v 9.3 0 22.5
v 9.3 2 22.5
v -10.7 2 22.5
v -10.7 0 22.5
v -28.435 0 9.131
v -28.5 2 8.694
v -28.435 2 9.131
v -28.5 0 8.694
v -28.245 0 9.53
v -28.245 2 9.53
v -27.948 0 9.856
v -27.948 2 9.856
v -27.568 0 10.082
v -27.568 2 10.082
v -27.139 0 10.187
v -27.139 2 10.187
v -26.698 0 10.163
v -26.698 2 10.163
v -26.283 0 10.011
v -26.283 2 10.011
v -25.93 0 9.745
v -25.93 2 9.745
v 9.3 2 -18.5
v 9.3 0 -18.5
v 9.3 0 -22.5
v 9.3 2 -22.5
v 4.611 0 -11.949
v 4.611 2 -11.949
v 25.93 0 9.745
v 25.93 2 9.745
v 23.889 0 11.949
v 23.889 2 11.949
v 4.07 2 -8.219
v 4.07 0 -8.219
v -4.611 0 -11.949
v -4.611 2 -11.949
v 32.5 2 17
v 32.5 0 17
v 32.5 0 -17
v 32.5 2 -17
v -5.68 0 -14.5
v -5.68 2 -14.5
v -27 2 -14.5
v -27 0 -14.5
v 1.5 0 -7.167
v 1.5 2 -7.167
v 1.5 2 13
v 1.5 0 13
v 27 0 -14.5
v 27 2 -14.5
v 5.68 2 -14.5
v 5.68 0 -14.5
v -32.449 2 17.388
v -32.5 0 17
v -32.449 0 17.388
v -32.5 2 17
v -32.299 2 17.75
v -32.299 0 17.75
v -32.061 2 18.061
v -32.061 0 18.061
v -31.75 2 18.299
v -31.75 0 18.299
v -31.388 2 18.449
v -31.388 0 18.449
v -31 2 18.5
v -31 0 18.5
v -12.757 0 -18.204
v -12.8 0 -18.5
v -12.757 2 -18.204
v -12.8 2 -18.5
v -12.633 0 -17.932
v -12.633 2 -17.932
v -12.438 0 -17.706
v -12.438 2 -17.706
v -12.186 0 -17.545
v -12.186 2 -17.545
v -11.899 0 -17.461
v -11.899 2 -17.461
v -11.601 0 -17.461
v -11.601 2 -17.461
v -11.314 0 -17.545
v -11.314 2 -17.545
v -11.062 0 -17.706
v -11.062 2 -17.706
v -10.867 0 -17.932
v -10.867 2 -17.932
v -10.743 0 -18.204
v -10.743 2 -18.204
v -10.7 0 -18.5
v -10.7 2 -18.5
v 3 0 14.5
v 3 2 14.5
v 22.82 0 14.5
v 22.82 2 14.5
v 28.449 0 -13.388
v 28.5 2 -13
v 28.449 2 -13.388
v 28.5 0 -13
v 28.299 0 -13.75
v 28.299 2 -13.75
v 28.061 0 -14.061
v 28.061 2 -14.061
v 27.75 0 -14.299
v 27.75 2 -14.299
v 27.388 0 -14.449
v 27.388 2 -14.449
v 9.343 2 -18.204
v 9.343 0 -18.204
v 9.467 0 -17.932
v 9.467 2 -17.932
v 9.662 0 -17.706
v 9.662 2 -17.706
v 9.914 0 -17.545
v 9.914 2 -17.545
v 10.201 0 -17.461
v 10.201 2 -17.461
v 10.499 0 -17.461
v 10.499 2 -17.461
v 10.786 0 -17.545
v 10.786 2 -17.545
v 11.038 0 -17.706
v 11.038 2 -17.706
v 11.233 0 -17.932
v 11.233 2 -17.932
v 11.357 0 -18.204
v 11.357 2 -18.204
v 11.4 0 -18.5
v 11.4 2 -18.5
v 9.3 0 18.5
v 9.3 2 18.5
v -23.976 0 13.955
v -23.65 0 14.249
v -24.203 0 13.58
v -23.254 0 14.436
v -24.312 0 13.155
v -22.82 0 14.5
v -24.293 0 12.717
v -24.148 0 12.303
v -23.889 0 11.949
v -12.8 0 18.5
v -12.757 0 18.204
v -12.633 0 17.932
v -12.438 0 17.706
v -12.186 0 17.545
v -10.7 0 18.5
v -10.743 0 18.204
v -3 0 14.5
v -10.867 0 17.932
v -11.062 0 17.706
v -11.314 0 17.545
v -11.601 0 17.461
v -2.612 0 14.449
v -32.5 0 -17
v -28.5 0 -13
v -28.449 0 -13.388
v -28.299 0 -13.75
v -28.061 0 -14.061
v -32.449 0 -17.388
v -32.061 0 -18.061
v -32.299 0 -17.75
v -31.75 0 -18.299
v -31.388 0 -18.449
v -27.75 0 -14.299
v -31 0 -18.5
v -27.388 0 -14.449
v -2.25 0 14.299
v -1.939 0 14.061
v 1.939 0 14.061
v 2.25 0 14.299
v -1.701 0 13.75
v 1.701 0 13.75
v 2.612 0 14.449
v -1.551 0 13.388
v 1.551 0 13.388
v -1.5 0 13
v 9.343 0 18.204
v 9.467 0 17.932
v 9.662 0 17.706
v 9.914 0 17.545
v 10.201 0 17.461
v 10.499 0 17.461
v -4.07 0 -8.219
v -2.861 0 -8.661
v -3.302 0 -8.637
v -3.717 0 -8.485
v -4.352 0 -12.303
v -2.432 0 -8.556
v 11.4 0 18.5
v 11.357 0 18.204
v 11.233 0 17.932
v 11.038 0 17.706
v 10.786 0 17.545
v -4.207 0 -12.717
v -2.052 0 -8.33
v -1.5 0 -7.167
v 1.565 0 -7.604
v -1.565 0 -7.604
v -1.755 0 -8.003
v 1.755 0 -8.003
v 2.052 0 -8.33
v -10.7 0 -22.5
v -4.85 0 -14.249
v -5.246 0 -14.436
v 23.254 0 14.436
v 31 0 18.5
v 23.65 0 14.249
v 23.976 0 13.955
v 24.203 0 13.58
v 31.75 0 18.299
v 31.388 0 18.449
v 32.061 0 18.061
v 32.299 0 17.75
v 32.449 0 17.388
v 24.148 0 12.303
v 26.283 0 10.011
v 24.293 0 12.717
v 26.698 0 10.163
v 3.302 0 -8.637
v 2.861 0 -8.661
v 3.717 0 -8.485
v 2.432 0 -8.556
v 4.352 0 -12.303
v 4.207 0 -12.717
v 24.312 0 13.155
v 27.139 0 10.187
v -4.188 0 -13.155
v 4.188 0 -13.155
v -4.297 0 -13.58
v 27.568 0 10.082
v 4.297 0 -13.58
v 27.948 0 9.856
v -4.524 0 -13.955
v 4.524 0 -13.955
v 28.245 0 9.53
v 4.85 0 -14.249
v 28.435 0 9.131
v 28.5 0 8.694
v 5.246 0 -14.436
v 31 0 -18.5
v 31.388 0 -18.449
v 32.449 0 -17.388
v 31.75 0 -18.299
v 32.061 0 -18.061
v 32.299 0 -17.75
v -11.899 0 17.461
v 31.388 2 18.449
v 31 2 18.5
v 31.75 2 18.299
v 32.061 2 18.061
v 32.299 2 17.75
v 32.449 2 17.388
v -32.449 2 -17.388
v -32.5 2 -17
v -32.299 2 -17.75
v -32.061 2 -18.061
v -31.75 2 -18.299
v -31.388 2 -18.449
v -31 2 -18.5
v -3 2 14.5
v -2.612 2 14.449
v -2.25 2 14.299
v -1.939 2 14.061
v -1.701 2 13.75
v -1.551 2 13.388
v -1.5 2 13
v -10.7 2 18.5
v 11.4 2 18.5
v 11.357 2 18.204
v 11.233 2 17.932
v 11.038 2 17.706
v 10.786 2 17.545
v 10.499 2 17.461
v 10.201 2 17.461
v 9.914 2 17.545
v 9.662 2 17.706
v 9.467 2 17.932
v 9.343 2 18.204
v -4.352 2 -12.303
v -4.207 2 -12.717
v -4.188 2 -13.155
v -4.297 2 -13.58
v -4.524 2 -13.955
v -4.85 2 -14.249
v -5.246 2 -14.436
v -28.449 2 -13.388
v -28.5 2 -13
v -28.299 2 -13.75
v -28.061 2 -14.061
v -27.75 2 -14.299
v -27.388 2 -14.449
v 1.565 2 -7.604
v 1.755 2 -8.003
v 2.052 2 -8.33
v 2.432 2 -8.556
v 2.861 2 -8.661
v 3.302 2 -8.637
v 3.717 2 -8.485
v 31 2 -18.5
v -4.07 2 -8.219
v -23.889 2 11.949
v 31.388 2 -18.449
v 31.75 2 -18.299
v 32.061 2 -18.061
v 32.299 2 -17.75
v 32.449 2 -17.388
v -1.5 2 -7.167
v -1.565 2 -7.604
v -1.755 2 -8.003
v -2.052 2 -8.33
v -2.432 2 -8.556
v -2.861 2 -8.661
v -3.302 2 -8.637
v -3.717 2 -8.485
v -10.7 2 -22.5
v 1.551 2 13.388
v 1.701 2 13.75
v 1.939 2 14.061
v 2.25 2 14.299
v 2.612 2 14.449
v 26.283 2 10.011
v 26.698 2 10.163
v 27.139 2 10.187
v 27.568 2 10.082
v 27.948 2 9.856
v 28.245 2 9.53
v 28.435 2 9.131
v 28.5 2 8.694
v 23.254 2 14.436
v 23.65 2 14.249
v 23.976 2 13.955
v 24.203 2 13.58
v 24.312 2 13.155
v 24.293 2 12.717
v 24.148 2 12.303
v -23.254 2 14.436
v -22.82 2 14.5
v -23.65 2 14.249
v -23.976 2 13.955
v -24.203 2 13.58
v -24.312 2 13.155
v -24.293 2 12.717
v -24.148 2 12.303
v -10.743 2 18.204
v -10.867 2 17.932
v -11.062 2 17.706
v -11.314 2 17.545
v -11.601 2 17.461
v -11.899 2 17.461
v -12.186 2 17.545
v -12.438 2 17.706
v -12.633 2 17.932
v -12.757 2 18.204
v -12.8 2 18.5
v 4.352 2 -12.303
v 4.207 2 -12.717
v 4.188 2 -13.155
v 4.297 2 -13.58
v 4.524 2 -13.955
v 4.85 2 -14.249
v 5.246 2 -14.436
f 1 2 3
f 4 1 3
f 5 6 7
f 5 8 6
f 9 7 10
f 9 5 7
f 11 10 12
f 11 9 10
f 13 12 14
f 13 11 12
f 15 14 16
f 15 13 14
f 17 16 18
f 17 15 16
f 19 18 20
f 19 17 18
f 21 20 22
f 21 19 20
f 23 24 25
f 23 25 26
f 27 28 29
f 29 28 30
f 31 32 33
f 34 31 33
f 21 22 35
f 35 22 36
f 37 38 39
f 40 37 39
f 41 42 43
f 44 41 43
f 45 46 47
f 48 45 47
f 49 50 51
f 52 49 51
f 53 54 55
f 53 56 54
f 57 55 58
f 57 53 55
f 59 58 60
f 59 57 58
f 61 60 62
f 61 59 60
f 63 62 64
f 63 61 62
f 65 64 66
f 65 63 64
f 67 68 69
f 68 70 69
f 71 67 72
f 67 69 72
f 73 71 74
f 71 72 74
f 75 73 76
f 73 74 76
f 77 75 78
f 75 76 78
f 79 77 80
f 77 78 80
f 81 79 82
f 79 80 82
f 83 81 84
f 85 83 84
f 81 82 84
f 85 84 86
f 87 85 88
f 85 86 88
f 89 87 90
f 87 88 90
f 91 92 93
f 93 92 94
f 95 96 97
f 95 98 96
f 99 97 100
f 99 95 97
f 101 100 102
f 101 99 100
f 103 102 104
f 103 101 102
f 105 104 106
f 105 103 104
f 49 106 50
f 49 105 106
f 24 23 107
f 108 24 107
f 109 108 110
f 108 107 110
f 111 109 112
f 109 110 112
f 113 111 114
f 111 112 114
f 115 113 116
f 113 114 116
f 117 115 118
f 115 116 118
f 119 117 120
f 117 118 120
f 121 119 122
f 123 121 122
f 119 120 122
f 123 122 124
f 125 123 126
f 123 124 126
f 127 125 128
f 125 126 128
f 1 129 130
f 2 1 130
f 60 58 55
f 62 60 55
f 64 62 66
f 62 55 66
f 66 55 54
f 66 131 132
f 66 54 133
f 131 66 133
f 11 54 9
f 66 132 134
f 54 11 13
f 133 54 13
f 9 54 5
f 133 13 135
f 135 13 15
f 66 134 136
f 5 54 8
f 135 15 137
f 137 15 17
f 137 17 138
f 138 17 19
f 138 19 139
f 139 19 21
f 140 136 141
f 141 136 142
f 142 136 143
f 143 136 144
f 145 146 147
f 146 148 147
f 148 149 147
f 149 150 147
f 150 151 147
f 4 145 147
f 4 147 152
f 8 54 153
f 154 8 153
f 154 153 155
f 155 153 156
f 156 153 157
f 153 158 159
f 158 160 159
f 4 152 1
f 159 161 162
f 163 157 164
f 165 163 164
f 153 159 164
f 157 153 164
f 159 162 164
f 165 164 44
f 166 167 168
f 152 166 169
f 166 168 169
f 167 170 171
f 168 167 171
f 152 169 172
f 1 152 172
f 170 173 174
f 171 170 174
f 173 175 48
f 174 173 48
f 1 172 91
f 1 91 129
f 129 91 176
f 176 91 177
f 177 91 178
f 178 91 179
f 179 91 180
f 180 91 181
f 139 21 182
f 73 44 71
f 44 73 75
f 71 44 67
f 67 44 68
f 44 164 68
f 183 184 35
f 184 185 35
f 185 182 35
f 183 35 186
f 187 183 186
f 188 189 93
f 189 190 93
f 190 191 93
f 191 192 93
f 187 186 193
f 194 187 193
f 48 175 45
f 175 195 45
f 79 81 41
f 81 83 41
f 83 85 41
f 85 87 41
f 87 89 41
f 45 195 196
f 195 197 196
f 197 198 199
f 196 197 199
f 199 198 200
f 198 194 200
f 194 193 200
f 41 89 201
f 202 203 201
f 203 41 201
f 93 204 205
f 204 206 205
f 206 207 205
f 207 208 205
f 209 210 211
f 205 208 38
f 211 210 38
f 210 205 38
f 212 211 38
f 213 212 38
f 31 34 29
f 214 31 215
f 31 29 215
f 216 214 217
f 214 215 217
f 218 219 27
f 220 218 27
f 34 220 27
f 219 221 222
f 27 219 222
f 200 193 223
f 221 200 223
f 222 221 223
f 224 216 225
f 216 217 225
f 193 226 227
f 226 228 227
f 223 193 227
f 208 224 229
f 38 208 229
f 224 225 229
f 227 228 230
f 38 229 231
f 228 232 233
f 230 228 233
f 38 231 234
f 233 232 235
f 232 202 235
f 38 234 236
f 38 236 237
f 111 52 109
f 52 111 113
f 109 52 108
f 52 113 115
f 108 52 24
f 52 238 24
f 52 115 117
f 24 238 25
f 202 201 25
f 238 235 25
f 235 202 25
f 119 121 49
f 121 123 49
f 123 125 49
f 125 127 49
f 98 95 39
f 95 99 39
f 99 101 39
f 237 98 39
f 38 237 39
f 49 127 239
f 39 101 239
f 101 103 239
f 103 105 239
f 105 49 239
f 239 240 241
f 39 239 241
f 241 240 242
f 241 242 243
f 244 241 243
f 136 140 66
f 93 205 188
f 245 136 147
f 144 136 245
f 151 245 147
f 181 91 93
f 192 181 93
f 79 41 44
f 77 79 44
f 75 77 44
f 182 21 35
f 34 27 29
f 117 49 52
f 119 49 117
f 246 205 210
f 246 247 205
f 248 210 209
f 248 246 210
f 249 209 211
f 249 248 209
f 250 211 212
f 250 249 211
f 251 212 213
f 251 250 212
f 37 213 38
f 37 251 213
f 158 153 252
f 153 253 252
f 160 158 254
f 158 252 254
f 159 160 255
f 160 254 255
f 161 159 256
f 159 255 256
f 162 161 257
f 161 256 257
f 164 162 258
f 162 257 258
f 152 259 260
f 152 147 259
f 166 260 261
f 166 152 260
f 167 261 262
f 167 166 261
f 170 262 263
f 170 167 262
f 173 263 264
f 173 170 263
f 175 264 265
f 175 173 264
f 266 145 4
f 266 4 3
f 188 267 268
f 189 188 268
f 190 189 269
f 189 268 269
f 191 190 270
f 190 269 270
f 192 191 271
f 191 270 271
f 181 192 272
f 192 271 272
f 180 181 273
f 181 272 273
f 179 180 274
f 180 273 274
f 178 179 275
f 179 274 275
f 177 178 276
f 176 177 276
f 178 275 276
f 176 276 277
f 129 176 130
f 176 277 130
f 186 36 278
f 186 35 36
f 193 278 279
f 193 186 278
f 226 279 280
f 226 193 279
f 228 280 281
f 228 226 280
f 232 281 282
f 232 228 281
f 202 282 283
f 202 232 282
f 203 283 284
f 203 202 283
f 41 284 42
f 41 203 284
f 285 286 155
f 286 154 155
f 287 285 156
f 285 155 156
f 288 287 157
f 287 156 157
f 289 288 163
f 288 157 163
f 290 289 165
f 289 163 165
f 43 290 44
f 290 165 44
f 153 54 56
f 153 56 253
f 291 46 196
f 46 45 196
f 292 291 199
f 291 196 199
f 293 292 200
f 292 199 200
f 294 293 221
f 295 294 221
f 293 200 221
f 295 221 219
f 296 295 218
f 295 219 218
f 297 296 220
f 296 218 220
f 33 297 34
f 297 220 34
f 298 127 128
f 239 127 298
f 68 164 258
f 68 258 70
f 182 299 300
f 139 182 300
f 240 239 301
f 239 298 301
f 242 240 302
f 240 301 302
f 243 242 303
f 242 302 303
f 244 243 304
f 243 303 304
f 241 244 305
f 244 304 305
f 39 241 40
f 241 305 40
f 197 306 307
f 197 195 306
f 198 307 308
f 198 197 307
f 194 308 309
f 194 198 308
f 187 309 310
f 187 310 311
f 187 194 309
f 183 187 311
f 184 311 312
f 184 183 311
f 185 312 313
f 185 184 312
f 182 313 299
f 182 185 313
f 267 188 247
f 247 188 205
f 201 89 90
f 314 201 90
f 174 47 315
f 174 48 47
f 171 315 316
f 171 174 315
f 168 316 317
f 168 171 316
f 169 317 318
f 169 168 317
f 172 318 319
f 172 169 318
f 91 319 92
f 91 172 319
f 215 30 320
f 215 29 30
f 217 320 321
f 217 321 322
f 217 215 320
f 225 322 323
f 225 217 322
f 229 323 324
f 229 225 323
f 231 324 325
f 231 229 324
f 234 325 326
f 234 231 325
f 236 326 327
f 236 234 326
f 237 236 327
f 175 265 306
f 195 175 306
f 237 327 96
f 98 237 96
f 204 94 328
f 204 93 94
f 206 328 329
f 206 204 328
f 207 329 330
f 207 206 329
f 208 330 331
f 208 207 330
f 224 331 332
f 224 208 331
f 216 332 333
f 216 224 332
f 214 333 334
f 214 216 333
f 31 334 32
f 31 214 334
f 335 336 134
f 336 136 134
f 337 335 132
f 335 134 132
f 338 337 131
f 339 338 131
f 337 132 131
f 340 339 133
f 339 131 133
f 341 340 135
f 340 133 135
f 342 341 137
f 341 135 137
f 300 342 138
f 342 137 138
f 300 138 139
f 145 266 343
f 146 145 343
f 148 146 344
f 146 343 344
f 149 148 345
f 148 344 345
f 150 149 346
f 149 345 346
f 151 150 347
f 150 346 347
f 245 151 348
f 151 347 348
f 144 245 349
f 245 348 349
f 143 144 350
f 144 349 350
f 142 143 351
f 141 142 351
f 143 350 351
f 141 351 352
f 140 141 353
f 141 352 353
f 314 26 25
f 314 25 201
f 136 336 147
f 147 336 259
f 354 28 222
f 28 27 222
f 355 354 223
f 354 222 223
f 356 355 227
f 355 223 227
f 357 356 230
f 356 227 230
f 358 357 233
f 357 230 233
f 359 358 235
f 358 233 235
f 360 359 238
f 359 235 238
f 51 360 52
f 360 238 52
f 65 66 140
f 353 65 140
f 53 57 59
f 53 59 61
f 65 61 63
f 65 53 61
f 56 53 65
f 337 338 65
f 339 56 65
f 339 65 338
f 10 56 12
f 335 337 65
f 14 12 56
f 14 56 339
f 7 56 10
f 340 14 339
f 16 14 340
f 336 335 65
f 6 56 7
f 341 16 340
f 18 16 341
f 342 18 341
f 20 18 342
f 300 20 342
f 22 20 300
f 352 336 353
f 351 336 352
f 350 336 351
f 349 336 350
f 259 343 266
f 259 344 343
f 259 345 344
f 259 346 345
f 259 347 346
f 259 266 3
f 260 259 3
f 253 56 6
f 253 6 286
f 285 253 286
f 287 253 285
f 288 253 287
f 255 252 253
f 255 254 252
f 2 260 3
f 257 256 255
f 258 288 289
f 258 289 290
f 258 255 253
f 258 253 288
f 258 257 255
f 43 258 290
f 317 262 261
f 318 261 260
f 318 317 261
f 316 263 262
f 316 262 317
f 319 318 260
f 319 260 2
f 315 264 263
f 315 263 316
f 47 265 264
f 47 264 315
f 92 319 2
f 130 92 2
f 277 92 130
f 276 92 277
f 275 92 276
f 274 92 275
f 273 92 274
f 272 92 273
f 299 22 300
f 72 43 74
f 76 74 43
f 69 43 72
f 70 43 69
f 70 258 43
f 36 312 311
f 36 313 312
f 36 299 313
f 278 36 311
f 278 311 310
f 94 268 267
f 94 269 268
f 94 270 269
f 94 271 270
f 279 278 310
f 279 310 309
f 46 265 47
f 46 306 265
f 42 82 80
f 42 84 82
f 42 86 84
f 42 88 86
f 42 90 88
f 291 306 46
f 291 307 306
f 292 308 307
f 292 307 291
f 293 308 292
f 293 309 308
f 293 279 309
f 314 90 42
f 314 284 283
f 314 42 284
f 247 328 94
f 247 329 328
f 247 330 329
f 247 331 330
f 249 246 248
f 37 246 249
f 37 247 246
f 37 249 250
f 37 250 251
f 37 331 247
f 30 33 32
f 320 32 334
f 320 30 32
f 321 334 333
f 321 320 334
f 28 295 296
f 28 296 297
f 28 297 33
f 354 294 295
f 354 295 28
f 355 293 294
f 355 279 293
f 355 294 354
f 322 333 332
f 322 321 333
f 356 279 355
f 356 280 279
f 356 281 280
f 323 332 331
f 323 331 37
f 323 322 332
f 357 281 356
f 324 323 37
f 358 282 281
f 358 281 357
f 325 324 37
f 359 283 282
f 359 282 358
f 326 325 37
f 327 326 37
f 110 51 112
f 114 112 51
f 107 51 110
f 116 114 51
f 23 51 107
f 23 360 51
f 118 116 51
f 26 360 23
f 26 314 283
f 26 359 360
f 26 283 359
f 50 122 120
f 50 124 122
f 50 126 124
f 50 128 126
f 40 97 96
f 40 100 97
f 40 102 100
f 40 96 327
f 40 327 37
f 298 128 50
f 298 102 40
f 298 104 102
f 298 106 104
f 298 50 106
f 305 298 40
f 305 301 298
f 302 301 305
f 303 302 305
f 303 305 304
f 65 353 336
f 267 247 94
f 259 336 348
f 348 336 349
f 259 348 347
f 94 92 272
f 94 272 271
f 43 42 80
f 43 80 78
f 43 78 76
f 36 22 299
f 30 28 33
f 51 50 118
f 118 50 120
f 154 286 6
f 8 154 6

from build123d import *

# Parameters (mm, degrees)
SKETCH_1_W          = 65
SKETCH_1_H          = 37
EXTRUDE_1_DEPTH     = 2
SKETCH_2_W          = 20
SKETCH_2_H          = 2
EXTRUDE_2_DEPTH     = 4
SKETCH_3_R          = 1.05
CUT_EXTRUDE_1_DEPTH = 4
CUT_EXTRUDE_2_DEPTH = 10
FILLET_1_R          = 1.5


with BuildPart() as part:
    # 草图1 → 凸台-拉伸1 (new body)
    with BuildSketch(Plane(origin=(0, 0, 0), x_dir=(1, 0, 0), z_dir=(0, 1, 0))):
        Rectangle(SKETCH_1_W, SKETCH_1_H)
    extrude(amount=EXTRUDE_1_DEPTH)

    # 草图2 → 凸台-拉伸2 (add)
    with BuildSketch(Plane(origin=(0, 0, -18.5), x_dir=(-1, 0, 0), z_dir=(0, 0, -1))):
        with Locations((0.7, 1)):
            Rectangle(SKETCH_2_W, SKETCH_2_H)
    extrude_2 = extrude(amount=EXTRUDE_2_DEPTH)

    # 镜向1: 凸台-拉伸2 across plane
    add(extrude_2.mirror(Plane.XY))

    # 草图3 → 切除-拉伸1 (cut)
    with BuildSketch(Plane(origin=(0, 2, 0), x_dir=(1, 0, 0), z_dir=(0, 1, 0))):
        with Locations((10.35, -18.5)):
            Circle(SKETCH_3_R)
        with Locations((-11.75, -18.5)):
            Circle(SKETCH_3_R)
        with Locations((-11.75, 18.5)):
            Circle(SKETCH_3_R)
        with Locations((10.35, 18.5)):
            Circle(SKETCH_3_R)
    extrude(amount=-CUT_EXTRUDE_1_DEPTH, mode=Mode.SUBTRACT)

    # 草图4 → 切除-拉伸2 (cut)
    with BuildSketch(Plane(origin=(0, 2, 0), x_dir=(1, 0, 0), z_dir=(0, 1, 0))):
        Polygon((-28.5, 14.5), (-28.5, -12.35999068), (-2.103112607, 14.5), align=None)
        Polygon((-26.396887393, -14.5), (-1.5, -14.5), (-1.5, 10.833674891), align=None)
        Polygon((1.5, 10.833674891), (1.5, -14.5), (26.396887393, -14.5), align=None)
        Polygon((2.103112607, 14.5), (28.5, -12.35999068), (28.5, 14.5), align=None)
    extrude(amount=-CUT_EXTRUDE_2_DEPTH, mode=Mode.SUBTRACT)

    # 圆角1
    fillet_1_edges = [part.edges().sort_by_distance(p)[0] for p in [
        (2.103112607, 1, -14.5),
        (28.5, 1, -14.5),
        (28.5, 1, 12.35999068),
        (-2.103112607, 1, -14.5),
        (-28.5, 1, 12.35999068),
        (-28.5, 1, -14.5),
        (32.5, 1, 18.5),
        (-32.5, 1, 18.5),
        (-32.5, 1, -18.5),
        (32.5, 1, -18.5),
        (-1.5, 1, -10.833674891),
        (-1.5, 1, 14.5),
        (-26.396887393, 1, 14.5),
        (1.5, 1, -10.833674891),
        (26.396887393, 1, 14.5),
        (1.5, 1, 14.5),
    ]]
    fillet(fillet_1_edges, radius=FILLET_1_R)


solid = part.part
